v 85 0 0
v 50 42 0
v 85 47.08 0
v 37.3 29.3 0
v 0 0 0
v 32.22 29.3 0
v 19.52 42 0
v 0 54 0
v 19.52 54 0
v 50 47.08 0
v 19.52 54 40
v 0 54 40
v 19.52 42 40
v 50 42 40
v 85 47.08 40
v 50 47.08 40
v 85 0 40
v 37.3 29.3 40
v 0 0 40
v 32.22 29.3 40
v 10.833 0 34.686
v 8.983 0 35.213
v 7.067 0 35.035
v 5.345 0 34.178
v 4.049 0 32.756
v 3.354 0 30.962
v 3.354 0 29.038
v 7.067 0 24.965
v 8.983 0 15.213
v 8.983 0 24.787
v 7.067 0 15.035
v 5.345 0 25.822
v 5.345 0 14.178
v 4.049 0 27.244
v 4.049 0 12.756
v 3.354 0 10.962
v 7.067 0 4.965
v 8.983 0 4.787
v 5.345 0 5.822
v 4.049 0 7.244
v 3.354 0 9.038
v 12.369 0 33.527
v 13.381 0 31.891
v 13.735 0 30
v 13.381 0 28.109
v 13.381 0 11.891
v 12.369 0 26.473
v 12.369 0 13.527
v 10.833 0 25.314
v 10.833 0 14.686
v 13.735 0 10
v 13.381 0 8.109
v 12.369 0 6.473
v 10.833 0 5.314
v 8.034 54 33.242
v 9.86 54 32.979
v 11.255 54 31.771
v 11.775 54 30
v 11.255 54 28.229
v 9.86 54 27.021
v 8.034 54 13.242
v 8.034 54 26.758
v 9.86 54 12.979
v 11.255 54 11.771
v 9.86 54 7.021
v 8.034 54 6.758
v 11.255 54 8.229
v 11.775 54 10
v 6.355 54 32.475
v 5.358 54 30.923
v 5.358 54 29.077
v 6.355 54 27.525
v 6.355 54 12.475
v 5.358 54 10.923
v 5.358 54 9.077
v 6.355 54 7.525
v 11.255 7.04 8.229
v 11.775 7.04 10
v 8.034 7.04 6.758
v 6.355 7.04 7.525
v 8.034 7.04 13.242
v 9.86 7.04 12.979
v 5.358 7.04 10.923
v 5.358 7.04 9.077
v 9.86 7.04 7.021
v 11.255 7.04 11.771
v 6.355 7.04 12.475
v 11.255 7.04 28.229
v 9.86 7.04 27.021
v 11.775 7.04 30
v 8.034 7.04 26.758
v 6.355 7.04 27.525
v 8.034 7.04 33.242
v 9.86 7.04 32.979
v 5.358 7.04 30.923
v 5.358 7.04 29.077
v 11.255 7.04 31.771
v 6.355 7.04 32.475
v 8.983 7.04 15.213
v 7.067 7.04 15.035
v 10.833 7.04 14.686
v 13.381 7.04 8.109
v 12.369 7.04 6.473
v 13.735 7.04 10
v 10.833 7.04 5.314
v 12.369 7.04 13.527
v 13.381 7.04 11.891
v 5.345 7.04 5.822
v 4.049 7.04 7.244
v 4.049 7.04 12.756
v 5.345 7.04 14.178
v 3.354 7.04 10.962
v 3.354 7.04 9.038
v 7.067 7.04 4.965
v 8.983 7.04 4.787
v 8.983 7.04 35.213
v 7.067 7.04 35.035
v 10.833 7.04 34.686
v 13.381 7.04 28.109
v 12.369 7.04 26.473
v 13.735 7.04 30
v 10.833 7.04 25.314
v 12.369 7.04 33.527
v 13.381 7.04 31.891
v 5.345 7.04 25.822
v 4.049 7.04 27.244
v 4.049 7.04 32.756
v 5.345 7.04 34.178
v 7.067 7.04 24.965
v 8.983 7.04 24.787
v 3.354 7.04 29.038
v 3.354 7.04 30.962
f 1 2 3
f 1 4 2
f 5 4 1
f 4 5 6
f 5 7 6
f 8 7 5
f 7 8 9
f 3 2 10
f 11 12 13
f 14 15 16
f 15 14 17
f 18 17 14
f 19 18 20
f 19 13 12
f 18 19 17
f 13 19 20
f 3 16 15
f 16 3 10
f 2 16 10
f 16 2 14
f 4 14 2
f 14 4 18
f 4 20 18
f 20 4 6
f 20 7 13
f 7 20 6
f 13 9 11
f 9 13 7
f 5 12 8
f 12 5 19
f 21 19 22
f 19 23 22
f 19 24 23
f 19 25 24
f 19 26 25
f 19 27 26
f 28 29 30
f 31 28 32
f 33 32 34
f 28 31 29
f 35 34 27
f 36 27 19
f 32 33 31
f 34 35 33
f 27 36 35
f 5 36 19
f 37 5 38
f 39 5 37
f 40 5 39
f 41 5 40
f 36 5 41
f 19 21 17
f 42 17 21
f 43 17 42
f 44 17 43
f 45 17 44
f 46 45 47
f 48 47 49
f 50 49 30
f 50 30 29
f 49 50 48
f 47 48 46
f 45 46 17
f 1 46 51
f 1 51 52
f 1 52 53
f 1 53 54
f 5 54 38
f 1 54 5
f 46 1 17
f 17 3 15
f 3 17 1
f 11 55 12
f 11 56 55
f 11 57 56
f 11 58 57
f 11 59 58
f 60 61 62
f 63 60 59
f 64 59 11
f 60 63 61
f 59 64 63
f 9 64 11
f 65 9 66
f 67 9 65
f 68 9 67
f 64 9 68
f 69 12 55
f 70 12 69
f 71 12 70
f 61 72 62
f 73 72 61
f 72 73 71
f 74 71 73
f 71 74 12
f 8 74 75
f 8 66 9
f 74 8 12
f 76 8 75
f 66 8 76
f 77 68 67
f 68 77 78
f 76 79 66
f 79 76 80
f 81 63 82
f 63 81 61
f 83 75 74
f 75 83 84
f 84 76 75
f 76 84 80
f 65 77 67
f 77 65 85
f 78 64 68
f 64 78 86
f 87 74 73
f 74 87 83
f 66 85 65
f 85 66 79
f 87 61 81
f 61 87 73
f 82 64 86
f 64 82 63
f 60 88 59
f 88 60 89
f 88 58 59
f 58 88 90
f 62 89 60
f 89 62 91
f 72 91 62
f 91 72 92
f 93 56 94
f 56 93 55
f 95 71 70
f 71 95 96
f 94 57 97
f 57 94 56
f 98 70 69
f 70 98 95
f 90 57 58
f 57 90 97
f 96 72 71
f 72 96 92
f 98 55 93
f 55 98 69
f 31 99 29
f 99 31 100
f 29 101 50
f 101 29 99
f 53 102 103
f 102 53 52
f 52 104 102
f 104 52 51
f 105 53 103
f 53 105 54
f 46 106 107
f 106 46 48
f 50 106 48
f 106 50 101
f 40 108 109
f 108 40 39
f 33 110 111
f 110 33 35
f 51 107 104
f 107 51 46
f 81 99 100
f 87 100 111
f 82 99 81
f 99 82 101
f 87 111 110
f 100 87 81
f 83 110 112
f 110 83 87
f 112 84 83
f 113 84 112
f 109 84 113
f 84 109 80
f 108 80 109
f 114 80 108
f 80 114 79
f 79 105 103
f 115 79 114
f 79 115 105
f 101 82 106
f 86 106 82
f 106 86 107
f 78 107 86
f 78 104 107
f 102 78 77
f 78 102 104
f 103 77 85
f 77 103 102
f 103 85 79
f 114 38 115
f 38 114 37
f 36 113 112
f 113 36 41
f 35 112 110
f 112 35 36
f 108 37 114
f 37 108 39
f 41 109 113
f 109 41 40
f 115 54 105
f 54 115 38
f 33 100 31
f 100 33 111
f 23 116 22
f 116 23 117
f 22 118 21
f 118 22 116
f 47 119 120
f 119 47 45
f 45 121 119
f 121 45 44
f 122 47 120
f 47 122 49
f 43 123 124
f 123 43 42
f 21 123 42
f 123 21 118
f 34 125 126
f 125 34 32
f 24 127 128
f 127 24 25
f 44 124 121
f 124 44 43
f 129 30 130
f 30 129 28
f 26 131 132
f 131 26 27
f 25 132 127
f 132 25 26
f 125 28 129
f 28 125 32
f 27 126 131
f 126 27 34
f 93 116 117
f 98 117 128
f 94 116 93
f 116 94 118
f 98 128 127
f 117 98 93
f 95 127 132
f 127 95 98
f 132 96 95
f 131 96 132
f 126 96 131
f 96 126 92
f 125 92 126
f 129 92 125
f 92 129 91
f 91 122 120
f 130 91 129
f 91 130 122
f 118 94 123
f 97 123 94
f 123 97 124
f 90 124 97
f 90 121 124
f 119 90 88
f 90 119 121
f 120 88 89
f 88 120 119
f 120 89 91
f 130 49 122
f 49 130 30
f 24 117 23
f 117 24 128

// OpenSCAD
// plateau: 0.20" 5.08mm
// height: 0.5" 12.7mm
// width: 1.10" 27.94mm
// + 0.20 at base

difference() {
    linear_extrude( height=40 )
        polygon( points=[ [0,0], 
                        [85,0], 
                        [85,47.08],
                        [50, 47.08],
                        [50, 42], // bottom 
                        [37.3, 29.3], // top : implied 90
                        [32.22, 29.3], // plateau
                        [19.52, 42], // top
                        [19.52, 47.08], // bottom
                        // broken::w
    
                        // triangle:
                        //[50, 42], // bottom 
                        //[35, 29], // top : implied 90
                        //[27, 29], // plateau
                        //[17, 41], // top
                        //[17, 63], // bottom
                        //[28, 63],
                        //[28, 74],
                        //[0, 74] ] 
                        [19.52, 63],
                        [0, 63] ]
                        );
    // to create complete:
    //translate([-0.1, 54, -0.1])
    //    cube([18, 2, 41]);
    // to create top:
    translate([-0.1, 54, -0.1])
        cube([50, 24, 41]);
    //to create bottom:
    //translate([-0.1, -0.1, -0.1])
    //    cube([86, 54, 41]);
    
    
    dia = 6.35 + 0.2;
    center = 17.0 / 2;
    depth = 86;
    translate([center, -0.1, 10])
        rotate([-90, 0, 0])
            cylinder(d=dia, h=depth);
    translate([center, -0.1, 30])
        rotate([-90, 0, 0])
            cylinder(d=dia, h=depth);
            
    cbore_dia = 10.47; // 0.411764 7/16	
    cbore_depth = 7.14; // .28089 25/89
    translate([center, -0.1, 10])
        rotate([-90, 0, 0])
            cylinder(d=cbore_dia, h=cbore_depth);
    translate([center, -0.1, 30])
        rotate([-90, 0, 0])
            cylinder(d=cbore_dia, h=cbore_depth);
}
